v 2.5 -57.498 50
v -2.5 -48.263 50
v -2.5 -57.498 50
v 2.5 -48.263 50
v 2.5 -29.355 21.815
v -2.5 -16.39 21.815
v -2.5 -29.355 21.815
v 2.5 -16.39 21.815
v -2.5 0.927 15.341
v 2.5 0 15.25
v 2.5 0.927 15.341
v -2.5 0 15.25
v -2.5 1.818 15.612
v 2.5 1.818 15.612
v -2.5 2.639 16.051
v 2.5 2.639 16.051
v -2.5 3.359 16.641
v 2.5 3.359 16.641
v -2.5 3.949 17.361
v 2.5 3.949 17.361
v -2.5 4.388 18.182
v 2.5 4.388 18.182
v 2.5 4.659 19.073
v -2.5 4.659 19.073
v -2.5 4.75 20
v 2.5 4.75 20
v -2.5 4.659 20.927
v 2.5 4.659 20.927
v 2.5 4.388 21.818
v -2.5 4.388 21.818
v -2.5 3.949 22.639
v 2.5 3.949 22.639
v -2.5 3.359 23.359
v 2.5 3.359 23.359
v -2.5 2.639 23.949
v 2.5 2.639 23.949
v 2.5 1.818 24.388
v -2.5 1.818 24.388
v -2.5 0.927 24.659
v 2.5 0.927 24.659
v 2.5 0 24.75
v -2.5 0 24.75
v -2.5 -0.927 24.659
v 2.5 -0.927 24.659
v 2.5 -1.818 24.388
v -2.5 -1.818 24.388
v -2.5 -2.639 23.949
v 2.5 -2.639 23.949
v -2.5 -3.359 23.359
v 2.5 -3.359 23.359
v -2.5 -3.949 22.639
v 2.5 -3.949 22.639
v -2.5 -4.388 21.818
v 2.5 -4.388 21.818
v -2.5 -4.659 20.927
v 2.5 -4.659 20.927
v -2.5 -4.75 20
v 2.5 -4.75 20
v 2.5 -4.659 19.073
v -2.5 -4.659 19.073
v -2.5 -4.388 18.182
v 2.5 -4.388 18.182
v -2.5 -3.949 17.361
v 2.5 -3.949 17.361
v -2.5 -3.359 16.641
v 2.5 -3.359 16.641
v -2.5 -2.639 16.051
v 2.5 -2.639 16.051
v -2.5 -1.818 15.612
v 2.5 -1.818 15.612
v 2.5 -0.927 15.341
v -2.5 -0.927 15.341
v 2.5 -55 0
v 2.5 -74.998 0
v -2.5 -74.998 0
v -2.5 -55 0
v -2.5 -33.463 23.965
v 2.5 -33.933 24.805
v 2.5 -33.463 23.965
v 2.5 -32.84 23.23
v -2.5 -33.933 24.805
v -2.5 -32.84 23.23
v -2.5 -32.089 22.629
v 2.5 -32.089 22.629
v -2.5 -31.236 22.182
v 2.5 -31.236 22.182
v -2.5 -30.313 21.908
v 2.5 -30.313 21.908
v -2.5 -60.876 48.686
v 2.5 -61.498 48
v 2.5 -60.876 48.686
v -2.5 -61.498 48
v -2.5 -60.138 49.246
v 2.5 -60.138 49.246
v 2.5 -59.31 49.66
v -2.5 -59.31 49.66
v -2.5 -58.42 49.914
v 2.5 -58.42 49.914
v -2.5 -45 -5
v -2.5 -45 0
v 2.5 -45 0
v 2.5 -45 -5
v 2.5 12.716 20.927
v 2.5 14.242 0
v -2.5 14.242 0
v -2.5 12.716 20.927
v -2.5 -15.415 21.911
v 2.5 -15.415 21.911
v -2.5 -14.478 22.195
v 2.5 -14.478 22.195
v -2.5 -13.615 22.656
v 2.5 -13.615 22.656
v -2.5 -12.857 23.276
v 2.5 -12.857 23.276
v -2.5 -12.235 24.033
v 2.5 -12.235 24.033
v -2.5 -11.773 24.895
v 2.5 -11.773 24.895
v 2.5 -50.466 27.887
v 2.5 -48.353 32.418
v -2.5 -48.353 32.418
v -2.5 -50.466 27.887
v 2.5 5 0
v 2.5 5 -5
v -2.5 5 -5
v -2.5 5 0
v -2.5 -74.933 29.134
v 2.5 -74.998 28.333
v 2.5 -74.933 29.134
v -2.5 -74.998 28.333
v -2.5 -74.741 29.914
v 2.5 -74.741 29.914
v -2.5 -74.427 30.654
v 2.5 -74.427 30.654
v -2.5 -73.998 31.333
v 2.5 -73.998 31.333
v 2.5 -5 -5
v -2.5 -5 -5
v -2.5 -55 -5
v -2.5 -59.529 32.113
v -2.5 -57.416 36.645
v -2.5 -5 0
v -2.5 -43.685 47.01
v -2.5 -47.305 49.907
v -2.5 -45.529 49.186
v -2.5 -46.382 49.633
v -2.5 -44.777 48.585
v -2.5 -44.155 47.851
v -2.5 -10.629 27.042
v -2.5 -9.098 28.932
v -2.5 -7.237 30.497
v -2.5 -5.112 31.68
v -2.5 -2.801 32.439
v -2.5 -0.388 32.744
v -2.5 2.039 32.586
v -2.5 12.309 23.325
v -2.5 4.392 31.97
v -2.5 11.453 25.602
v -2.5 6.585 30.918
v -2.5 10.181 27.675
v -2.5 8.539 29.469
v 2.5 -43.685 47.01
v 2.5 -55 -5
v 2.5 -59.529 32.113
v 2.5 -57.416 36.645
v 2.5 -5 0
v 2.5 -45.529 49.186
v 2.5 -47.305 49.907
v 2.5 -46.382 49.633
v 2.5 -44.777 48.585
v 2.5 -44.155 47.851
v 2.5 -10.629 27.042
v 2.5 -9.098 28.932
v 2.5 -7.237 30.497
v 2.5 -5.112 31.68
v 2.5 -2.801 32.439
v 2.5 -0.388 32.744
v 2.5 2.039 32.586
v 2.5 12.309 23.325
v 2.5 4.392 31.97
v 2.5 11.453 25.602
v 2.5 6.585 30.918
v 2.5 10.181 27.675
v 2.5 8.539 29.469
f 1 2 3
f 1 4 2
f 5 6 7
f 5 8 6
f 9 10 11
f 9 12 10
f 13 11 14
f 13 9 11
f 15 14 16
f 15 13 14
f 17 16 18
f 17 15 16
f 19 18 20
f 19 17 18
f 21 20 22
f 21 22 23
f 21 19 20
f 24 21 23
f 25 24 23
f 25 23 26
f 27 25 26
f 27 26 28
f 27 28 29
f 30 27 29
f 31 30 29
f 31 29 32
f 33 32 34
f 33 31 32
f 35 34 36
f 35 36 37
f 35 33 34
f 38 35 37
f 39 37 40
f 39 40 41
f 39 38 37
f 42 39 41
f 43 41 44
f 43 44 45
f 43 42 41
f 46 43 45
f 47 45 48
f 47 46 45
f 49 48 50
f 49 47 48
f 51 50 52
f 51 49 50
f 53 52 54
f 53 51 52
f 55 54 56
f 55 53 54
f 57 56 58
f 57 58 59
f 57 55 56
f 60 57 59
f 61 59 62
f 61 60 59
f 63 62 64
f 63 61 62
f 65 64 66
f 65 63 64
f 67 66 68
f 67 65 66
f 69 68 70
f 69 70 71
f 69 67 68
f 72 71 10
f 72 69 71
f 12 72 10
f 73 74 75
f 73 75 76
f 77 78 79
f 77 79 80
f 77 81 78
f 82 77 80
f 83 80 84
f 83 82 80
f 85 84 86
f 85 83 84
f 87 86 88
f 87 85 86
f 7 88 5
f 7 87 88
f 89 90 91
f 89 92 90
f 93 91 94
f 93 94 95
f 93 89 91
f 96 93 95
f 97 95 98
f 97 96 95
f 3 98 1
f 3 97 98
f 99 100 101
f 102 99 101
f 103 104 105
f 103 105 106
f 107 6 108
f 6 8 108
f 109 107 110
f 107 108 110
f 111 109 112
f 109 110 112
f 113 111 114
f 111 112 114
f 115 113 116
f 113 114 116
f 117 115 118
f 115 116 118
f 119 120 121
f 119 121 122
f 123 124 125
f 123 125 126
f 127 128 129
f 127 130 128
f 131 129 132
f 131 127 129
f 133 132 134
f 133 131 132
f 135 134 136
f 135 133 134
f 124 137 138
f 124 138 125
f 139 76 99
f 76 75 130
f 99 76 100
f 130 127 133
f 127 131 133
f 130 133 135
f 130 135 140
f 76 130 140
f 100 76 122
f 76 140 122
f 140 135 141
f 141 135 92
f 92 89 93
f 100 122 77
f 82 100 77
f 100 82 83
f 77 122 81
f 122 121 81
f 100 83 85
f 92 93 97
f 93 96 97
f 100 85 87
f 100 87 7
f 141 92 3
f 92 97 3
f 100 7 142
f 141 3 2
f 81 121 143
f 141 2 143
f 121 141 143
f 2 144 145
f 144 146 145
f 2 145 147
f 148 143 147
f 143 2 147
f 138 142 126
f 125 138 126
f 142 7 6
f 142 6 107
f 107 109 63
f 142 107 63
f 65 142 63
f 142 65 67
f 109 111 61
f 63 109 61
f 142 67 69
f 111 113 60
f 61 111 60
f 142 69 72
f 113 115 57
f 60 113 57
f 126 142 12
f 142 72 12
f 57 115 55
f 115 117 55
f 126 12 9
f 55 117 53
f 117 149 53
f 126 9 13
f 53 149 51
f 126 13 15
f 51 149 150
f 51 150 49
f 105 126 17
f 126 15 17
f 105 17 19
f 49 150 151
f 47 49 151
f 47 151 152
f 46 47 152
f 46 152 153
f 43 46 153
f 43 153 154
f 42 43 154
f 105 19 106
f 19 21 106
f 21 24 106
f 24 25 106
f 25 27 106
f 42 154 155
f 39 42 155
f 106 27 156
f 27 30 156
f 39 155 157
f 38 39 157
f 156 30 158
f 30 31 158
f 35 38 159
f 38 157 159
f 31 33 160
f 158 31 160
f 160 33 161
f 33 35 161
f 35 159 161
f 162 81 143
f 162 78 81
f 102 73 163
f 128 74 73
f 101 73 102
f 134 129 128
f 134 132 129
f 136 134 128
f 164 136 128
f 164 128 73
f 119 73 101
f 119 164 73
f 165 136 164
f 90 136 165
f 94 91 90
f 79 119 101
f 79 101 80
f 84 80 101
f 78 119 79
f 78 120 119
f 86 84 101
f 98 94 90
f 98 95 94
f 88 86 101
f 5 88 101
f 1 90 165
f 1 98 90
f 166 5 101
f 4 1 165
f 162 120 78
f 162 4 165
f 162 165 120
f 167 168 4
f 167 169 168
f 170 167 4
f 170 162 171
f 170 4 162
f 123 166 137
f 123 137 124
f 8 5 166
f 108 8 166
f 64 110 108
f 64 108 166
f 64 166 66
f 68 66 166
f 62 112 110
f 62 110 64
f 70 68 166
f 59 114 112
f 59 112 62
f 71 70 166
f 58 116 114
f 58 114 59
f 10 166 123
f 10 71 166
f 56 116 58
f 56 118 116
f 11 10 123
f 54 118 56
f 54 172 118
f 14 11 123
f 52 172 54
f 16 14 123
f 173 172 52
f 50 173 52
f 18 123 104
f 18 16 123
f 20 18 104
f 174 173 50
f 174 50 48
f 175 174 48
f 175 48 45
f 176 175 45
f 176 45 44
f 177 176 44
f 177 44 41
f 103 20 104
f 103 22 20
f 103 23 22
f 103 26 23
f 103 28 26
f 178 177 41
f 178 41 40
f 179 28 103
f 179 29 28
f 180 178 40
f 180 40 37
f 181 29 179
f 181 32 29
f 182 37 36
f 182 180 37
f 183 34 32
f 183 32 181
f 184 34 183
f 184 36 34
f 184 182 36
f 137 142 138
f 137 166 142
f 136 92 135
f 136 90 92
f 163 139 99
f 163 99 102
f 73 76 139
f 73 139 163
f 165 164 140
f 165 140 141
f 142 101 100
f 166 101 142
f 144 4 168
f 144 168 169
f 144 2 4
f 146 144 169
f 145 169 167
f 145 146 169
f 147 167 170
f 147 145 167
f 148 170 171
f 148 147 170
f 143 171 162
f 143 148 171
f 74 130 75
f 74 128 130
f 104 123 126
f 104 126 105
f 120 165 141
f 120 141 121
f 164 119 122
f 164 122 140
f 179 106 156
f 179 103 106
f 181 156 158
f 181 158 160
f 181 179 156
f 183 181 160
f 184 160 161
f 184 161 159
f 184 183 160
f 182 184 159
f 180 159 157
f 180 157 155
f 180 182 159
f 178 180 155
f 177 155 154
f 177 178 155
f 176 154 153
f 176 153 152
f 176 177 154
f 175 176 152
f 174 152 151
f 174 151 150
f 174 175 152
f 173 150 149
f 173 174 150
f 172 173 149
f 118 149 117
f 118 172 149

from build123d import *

# Parameters (mm, degrees)
SKETCH1_R           = 4.75
BOSS_EXTRUDE1_DEPTH = 2.5
FILLET1_R           = 5
CUT_EXTRUDE1_REACH  = 92.275
SKETCH3_W           = 5
SKETCH3_H           = 10
BOSS_EXTRUDE2_DEPTH = 5


with BuildPart() as part:
    # Sketch1 → Boss-Extrude1 (new, symmetric)
    with BuildSketch(Plane.YZ):
        with BuildLine():
            Line((-15.757717512, 0), (-5, 0))
            Line((-5, 0), (-5, -5))
            Line((-5, -5), (5, -5))
            Line((5, -5), (5, 0))
            Line((5, 0), (14.242282488, 0))
            Line((14.242282488, 0), (12.716235334, 20.927285791))
            ThreePointArc((12.716235334, 20.927285791), (0.446501859, 32.742179409), (-12.620138577, 21.815103933))
            Line((-12.620138577, 21.815103933), (-32.620138577, 21.815103933))
            Line((-32.620138577, 21.815103933), (-44.997717512, 50))
            Line((-44.997717512, 50), (-59.997717512, 50))
            Line((-59.997717512, 50), (-74.997717512, 30))
            Line((-74.997717512, 30), (-74.997717512, 0))
            Line((-74.997717512, 0), (-15.757717512, 0))
        make_face()
        with Locations(Location((0, 20, 0), (0, 0, 270))):
            Circle(SKETCH1_R, mode=Mode.SUBTRACT)
    extrude(amount=BOSS_EXTRUDE1_DEPTH, both=True)

    # Fillet1
    fillet1_edges = [part.edges().sort_by_distance(p)[0] for p in [
        (0, -74.997717512, 30),
        (0, -59.997717512, 50),
        (0, -44.997717512, 50),
        (0, -32.620138577, 21.815103933),
        (0, -12.620138577, 21.815103933),
    ]]
    fillet(fillet1_edges, radius=FILLET1_R)

    # Sketch2 → Cut-Extrude1 (cut, up to next)
    with BuildSketch(Plane.YZ.offset(2.5), mode=Mode.PRIVATE) as cut_extrude1_sk1:
        Polygon((-50.466178577, 27.886908691), (-59.529256447, 32.113091309), (-57.416165138, 36.644630244), (-48.353087268, 32.418447626), align=None)
    cut_extrude1_tool1 = extrude(cut_extrude1_sk1.sketch, amount=-CUT_EXTRUDE1_REACH, mode=Mode.PRIVATE) & part.part
    add(cut_extrude1_tool1.solids().sort_by_distance((2.5, -53.941172, 32.265769))[0], mode=Mode.SUBTRACT)

    # Sketch3 → Boss-Extrude2 (add)
    with BuildSketch(Plane(origin=(0, 0, 0), x_dir=(1, 0, 0), z_dir=(0, 0, -1))):
        with Locations((0, 50)):
            Rectangle(SKETCH3_W, SKETCH3_H)
    extrude(amount=BOSS_EXTRUDE2_DEPTH)


solid = part.part
